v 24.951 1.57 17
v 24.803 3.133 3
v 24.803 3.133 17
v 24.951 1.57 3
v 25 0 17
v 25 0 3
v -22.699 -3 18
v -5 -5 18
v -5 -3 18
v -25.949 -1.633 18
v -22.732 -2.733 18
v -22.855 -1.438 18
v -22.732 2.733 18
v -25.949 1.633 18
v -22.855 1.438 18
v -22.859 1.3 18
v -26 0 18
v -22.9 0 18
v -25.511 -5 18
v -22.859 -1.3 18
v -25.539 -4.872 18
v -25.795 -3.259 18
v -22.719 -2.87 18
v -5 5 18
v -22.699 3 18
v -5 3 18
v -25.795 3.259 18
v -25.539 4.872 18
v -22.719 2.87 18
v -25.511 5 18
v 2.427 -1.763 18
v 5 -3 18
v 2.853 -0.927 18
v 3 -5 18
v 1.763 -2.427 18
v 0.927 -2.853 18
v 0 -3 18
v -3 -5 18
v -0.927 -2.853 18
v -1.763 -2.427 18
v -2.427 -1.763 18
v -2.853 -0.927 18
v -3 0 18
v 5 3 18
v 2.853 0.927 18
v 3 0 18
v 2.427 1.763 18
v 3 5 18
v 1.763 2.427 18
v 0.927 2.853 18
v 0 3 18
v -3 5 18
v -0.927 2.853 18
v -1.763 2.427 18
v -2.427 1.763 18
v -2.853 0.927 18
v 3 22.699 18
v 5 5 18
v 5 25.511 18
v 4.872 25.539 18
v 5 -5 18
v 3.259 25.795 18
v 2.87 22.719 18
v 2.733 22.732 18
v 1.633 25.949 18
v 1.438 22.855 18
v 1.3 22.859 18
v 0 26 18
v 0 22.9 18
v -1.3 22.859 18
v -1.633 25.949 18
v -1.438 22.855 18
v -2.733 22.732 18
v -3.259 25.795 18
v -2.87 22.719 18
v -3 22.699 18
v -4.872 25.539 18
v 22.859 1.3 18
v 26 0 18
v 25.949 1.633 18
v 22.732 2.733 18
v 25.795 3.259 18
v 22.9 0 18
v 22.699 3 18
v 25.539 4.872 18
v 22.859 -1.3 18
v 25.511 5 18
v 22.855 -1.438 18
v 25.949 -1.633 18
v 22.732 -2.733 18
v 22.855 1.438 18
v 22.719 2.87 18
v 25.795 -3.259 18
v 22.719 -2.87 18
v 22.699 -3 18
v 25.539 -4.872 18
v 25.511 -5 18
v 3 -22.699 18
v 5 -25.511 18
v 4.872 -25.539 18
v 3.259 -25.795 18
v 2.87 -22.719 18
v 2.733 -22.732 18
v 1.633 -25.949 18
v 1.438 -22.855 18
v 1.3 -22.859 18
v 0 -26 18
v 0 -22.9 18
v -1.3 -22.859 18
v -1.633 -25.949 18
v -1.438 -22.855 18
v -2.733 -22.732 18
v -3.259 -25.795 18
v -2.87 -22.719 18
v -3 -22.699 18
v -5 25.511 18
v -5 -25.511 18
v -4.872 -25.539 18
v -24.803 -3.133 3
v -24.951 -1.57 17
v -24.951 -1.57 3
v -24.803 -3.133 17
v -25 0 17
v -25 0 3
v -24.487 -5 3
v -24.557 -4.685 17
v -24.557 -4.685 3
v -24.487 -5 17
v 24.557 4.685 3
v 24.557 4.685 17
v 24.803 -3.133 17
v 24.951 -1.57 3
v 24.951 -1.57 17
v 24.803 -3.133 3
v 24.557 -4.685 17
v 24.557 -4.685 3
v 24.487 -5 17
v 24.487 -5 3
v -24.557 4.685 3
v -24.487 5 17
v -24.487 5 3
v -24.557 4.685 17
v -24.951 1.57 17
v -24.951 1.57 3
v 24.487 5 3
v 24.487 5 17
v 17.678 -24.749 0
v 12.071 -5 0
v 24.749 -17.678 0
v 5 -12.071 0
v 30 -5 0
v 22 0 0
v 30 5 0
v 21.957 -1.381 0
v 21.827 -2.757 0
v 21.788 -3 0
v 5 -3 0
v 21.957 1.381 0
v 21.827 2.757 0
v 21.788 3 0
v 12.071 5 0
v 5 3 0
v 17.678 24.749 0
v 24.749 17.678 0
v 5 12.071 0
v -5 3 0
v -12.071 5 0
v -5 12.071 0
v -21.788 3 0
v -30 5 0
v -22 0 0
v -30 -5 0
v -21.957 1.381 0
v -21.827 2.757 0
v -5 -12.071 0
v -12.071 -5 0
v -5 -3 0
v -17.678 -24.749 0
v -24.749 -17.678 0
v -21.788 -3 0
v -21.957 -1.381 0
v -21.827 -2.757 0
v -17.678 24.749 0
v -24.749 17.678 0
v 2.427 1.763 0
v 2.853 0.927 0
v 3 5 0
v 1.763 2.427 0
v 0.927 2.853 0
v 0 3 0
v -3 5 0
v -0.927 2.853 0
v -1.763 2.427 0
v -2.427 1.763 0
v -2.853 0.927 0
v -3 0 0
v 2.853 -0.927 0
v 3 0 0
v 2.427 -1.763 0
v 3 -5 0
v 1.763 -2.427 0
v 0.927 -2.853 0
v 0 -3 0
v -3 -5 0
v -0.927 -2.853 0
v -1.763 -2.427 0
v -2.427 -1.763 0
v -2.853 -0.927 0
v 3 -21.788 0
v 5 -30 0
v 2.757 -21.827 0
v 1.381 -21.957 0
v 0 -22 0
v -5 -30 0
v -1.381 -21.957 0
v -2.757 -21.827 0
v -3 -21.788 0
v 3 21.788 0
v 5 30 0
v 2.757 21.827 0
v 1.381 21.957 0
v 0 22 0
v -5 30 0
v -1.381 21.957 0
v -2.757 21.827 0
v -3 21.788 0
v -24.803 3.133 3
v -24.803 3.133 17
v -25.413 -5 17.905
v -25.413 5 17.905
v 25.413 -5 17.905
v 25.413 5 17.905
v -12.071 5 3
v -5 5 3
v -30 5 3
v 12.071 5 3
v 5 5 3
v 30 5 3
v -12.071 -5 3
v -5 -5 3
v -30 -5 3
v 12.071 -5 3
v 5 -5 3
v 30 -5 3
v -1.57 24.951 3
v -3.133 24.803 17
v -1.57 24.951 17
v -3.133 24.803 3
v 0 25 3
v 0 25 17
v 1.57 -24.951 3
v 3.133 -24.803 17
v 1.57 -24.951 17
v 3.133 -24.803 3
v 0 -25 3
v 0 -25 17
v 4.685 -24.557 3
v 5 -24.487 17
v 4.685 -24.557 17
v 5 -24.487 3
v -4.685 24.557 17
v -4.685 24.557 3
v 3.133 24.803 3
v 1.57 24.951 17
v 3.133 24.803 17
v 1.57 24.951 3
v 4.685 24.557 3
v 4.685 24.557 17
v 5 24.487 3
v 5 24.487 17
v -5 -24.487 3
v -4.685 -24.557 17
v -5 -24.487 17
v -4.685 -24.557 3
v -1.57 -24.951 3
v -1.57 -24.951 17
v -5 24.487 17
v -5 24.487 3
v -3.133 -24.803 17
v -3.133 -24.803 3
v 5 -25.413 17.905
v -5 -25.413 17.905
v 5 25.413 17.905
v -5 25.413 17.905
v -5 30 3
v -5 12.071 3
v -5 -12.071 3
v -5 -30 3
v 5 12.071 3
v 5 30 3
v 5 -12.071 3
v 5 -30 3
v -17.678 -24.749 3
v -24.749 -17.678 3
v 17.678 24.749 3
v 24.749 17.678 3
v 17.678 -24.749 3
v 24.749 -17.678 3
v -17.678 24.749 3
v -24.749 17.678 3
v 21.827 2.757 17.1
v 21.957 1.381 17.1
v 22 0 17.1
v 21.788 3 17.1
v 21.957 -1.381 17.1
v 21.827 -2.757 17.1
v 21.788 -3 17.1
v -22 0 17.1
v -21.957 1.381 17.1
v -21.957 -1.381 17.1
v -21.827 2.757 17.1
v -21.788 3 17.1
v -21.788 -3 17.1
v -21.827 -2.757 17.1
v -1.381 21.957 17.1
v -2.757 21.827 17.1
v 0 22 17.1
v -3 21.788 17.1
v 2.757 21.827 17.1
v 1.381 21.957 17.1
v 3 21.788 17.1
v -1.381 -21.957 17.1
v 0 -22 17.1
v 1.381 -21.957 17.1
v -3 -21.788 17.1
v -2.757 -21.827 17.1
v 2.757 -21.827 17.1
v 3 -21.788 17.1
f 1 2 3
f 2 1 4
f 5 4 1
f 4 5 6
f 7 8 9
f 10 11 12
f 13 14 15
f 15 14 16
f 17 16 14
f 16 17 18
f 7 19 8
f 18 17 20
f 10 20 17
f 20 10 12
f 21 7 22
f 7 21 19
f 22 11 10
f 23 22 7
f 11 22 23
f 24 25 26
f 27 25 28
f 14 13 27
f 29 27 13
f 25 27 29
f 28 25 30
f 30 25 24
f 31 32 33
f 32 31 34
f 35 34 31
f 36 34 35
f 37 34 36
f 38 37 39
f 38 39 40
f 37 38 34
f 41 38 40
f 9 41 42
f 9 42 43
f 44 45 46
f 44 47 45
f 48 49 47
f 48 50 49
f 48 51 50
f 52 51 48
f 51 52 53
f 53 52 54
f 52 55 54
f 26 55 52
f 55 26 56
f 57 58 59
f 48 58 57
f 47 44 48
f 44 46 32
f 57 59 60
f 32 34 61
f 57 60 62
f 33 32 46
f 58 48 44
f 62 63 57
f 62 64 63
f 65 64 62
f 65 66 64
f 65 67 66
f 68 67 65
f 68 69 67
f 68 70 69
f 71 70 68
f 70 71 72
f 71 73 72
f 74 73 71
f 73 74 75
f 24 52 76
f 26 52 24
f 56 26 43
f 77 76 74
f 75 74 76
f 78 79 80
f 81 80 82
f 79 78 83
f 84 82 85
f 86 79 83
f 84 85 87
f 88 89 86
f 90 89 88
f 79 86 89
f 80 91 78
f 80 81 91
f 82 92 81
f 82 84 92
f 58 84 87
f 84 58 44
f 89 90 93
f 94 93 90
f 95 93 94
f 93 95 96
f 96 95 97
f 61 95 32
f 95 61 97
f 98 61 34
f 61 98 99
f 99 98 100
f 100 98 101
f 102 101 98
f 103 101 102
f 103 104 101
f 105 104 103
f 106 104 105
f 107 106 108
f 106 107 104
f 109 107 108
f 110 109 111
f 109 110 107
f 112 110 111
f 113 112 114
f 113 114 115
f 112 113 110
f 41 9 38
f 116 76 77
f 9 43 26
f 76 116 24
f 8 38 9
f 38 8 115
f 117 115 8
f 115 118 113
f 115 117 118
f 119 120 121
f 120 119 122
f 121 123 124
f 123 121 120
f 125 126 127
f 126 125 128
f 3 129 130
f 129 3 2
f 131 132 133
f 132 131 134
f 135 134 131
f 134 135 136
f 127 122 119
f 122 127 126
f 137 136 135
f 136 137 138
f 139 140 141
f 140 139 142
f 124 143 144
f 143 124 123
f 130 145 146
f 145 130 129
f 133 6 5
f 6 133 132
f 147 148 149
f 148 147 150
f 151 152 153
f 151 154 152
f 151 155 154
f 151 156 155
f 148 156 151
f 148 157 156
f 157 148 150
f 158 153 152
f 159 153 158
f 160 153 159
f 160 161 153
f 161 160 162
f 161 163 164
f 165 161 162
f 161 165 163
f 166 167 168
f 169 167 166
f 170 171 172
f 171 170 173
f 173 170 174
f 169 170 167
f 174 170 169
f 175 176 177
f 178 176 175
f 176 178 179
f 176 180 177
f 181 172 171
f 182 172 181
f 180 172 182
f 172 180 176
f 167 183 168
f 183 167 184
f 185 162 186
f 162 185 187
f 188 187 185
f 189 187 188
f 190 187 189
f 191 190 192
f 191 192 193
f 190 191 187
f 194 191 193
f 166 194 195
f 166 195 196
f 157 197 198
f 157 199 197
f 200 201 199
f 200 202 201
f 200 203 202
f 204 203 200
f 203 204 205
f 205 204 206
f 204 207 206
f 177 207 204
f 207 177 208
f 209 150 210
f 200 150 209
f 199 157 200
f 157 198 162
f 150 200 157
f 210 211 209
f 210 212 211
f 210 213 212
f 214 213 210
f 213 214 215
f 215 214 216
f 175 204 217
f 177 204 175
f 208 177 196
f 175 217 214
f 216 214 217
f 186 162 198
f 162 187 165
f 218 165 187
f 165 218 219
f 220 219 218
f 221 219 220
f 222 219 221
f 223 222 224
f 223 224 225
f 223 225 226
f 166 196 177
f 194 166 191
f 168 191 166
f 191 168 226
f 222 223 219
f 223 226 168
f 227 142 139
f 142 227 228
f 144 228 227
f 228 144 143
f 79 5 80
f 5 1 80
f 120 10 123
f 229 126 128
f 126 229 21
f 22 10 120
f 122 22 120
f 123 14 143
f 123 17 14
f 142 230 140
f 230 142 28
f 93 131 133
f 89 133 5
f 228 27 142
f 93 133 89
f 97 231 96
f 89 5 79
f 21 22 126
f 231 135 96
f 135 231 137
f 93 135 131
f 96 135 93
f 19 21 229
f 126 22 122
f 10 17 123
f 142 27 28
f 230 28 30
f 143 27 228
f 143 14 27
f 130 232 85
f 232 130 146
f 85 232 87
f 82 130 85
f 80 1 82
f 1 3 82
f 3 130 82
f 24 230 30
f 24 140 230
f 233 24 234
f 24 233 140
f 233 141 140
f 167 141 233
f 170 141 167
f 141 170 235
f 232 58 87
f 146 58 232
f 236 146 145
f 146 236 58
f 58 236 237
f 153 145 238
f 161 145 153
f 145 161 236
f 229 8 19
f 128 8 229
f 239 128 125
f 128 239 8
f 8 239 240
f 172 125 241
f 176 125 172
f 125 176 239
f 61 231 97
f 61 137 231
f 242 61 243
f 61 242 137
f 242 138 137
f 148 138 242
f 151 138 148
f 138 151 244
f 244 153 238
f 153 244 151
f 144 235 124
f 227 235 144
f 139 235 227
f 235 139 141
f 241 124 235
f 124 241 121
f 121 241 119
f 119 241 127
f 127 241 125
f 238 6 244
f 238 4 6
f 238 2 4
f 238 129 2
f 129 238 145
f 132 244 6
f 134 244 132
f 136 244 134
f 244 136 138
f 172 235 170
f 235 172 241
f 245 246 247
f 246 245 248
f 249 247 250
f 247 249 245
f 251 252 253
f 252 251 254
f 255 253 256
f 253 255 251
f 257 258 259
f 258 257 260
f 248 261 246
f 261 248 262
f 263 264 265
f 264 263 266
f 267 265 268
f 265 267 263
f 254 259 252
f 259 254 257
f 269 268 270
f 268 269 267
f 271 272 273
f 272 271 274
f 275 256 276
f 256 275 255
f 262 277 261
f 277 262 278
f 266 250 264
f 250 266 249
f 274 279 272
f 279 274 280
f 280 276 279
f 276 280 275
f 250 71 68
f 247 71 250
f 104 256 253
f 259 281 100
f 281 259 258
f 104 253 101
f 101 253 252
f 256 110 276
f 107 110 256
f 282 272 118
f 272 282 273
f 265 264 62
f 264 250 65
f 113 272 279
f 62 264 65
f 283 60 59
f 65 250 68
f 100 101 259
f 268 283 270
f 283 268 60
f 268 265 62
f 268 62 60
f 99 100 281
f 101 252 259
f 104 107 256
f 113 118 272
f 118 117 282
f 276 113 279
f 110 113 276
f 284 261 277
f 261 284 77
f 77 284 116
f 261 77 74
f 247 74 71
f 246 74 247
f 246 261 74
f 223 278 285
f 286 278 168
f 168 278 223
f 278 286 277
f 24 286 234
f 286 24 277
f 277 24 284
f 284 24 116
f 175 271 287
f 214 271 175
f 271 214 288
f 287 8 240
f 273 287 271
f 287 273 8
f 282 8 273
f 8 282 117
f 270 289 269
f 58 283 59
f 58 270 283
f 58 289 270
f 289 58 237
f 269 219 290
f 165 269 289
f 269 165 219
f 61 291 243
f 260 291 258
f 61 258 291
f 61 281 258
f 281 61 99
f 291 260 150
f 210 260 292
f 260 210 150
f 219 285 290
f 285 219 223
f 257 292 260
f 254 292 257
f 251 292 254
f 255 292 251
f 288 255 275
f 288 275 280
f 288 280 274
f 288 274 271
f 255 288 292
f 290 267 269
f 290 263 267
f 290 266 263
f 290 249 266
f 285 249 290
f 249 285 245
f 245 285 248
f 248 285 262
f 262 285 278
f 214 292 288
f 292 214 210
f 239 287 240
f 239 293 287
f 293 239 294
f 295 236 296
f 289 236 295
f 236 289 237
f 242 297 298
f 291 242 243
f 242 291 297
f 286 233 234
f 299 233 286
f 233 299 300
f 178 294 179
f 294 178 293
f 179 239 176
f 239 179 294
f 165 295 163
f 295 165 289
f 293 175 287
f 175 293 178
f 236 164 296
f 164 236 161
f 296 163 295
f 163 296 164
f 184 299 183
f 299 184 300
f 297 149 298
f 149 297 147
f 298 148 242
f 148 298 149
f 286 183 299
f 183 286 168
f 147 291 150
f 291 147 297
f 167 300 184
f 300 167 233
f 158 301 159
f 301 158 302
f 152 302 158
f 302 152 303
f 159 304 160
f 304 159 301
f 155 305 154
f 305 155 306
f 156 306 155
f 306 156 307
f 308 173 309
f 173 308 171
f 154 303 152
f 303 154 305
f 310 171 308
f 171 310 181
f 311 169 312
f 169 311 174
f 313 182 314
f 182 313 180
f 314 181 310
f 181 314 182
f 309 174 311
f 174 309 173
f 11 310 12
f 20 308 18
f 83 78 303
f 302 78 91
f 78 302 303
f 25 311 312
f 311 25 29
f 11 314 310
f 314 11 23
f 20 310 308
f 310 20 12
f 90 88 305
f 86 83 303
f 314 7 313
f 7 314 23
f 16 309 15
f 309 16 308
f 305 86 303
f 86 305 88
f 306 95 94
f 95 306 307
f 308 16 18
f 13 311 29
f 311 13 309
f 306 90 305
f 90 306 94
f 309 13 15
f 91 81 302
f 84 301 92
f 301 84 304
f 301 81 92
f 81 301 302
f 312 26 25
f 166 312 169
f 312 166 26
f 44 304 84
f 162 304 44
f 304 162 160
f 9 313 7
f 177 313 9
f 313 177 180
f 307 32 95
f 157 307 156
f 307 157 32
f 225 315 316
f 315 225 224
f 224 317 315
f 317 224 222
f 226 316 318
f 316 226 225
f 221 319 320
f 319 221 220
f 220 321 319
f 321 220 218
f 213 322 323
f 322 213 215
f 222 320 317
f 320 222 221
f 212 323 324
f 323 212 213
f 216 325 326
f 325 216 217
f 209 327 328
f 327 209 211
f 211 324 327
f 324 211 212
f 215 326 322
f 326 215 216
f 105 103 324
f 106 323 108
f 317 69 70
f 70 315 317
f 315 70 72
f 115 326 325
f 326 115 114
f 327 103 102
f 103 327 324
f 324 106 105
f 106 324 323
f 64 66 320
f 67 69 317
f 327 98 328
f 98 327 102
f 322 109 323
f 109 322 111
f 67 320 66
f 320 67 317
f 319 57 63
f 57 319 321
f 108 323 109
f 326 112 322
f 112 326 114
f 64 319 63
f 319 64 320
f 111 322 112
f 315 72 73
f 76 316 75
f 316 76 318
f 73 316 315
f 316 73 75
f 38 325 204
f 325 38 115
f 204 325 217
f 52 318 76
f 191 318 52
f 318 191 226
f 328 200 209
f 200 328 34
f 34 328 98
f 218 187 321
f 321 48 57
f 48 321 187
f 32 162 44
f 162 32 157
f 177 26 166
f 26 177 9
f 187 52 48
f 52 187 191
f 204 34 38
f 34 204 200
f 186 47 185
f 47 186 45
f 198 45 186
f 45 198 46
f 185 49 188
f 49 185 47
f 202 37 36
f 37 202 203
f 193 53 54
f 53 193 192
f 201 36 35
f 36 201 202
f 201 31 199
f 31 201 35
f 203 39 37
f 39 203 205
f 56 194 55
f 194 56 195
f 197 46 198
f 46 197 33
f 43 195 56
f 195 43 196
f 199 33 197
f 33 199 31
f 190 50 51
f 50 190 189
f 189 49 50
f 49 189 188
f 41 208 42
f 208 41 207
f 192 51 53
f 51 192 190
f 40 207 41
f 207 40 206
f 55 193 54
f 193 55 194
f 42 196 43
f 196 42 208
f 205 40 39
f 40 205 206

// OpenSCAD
//
// Parametric spool bracket
//
// by Egil Kvaleberg
//
// Some spool types (measurements are approximate):
//
//   Standard 1kg plastic: 52 mm
//   Medium 1kg plastic: 38 mm
//   Small plastic 19.5 mm
//   Large 1kg paper/metal: 58 mm
//   Small 1kg plstic: 32 mm
//   Paper/plastic 1kg centre: 30.5 inset by 25, outer 72 mm
//
//*****************************************************************************
// Adjustables

// The spool center hole diameter
spool = 52.0;   // in mm

// Axle diameter	
axle_d = 6.0;	   // in mm   

// Arm height
arm_h = 18.0;    // in mm     

wall = 1*2.0;     // wall thickness

flange = 1*4;
flange_h = 1*3;		

ridge = 1*1.0;    // at end of arms

arm_w = axle_d + 2*wall;   // arm_width (can be set to other values)

fudge = 1*0.1; 

//*****************************************************************************
// View and printing

view(); 

module rounded_cube(d, y, z) 
{
	cyl_r = d/2 - ridge;
	intersection ( ){
		union () {
			cylinder(r = cyl_r, h = z, $fn=100);
			translate([0, 0, z-ridge]) cylinder(r1 = cyl_r, r2 = cyl_r+ridge, h=ridge, $fn=100);
		}
		translate([-d/2, -y/2, 0]) cube([d, y, z]);
	}
}

module add_flange(do)
{
	x = (do) ? spool+2*flange : 0;
	translate([-x/2, -arm_w/2, 0]) cube([x, arm_w, flange_h]);	
}

module add_arm()
{
	union () {
		rounded_cube(spool, arm_w, arm_h);	
		add_flange(true);
	}
}

module sub_arm()
{
	translate([0, 0, -fudge]) rounded_cube((spool-2*ridge)-2*wall, arm_w-2*wall, arm_h+2*fudge);	
}

module view()
{
	union () {
		difference () {
			union () {
				add_arm();
				rotate ([0, 0, 90]) add_arm();
				rotate ([0, 0, 45]) add_flange(spool > 6*axle_d); // only add flange if it makes sense
				rotate ([0, 0, 135]) add_flange(spool > 6*axle_d);
			}
			union () {
				sub_arm();
				rotate ([0, 0, 90]) sub_arm();
				translate([0, 0, -fudge])  cylinder(r = axle_d/2, h = arm_h+2*fudge, $fn=20); // centre hole
			}
		}
		difference ( ){
			translate([-arm_w/2, -arm_w/2, 0]) cube([arm_w, arm_w, arm_h]); // centre	piece
			translate([0, 0, -fudge])  cylinder(r = axle_d/2, h = arm_h+2*fudge, $fn=20); // axle hole
		}
	}
}


//*****************************************************************************
